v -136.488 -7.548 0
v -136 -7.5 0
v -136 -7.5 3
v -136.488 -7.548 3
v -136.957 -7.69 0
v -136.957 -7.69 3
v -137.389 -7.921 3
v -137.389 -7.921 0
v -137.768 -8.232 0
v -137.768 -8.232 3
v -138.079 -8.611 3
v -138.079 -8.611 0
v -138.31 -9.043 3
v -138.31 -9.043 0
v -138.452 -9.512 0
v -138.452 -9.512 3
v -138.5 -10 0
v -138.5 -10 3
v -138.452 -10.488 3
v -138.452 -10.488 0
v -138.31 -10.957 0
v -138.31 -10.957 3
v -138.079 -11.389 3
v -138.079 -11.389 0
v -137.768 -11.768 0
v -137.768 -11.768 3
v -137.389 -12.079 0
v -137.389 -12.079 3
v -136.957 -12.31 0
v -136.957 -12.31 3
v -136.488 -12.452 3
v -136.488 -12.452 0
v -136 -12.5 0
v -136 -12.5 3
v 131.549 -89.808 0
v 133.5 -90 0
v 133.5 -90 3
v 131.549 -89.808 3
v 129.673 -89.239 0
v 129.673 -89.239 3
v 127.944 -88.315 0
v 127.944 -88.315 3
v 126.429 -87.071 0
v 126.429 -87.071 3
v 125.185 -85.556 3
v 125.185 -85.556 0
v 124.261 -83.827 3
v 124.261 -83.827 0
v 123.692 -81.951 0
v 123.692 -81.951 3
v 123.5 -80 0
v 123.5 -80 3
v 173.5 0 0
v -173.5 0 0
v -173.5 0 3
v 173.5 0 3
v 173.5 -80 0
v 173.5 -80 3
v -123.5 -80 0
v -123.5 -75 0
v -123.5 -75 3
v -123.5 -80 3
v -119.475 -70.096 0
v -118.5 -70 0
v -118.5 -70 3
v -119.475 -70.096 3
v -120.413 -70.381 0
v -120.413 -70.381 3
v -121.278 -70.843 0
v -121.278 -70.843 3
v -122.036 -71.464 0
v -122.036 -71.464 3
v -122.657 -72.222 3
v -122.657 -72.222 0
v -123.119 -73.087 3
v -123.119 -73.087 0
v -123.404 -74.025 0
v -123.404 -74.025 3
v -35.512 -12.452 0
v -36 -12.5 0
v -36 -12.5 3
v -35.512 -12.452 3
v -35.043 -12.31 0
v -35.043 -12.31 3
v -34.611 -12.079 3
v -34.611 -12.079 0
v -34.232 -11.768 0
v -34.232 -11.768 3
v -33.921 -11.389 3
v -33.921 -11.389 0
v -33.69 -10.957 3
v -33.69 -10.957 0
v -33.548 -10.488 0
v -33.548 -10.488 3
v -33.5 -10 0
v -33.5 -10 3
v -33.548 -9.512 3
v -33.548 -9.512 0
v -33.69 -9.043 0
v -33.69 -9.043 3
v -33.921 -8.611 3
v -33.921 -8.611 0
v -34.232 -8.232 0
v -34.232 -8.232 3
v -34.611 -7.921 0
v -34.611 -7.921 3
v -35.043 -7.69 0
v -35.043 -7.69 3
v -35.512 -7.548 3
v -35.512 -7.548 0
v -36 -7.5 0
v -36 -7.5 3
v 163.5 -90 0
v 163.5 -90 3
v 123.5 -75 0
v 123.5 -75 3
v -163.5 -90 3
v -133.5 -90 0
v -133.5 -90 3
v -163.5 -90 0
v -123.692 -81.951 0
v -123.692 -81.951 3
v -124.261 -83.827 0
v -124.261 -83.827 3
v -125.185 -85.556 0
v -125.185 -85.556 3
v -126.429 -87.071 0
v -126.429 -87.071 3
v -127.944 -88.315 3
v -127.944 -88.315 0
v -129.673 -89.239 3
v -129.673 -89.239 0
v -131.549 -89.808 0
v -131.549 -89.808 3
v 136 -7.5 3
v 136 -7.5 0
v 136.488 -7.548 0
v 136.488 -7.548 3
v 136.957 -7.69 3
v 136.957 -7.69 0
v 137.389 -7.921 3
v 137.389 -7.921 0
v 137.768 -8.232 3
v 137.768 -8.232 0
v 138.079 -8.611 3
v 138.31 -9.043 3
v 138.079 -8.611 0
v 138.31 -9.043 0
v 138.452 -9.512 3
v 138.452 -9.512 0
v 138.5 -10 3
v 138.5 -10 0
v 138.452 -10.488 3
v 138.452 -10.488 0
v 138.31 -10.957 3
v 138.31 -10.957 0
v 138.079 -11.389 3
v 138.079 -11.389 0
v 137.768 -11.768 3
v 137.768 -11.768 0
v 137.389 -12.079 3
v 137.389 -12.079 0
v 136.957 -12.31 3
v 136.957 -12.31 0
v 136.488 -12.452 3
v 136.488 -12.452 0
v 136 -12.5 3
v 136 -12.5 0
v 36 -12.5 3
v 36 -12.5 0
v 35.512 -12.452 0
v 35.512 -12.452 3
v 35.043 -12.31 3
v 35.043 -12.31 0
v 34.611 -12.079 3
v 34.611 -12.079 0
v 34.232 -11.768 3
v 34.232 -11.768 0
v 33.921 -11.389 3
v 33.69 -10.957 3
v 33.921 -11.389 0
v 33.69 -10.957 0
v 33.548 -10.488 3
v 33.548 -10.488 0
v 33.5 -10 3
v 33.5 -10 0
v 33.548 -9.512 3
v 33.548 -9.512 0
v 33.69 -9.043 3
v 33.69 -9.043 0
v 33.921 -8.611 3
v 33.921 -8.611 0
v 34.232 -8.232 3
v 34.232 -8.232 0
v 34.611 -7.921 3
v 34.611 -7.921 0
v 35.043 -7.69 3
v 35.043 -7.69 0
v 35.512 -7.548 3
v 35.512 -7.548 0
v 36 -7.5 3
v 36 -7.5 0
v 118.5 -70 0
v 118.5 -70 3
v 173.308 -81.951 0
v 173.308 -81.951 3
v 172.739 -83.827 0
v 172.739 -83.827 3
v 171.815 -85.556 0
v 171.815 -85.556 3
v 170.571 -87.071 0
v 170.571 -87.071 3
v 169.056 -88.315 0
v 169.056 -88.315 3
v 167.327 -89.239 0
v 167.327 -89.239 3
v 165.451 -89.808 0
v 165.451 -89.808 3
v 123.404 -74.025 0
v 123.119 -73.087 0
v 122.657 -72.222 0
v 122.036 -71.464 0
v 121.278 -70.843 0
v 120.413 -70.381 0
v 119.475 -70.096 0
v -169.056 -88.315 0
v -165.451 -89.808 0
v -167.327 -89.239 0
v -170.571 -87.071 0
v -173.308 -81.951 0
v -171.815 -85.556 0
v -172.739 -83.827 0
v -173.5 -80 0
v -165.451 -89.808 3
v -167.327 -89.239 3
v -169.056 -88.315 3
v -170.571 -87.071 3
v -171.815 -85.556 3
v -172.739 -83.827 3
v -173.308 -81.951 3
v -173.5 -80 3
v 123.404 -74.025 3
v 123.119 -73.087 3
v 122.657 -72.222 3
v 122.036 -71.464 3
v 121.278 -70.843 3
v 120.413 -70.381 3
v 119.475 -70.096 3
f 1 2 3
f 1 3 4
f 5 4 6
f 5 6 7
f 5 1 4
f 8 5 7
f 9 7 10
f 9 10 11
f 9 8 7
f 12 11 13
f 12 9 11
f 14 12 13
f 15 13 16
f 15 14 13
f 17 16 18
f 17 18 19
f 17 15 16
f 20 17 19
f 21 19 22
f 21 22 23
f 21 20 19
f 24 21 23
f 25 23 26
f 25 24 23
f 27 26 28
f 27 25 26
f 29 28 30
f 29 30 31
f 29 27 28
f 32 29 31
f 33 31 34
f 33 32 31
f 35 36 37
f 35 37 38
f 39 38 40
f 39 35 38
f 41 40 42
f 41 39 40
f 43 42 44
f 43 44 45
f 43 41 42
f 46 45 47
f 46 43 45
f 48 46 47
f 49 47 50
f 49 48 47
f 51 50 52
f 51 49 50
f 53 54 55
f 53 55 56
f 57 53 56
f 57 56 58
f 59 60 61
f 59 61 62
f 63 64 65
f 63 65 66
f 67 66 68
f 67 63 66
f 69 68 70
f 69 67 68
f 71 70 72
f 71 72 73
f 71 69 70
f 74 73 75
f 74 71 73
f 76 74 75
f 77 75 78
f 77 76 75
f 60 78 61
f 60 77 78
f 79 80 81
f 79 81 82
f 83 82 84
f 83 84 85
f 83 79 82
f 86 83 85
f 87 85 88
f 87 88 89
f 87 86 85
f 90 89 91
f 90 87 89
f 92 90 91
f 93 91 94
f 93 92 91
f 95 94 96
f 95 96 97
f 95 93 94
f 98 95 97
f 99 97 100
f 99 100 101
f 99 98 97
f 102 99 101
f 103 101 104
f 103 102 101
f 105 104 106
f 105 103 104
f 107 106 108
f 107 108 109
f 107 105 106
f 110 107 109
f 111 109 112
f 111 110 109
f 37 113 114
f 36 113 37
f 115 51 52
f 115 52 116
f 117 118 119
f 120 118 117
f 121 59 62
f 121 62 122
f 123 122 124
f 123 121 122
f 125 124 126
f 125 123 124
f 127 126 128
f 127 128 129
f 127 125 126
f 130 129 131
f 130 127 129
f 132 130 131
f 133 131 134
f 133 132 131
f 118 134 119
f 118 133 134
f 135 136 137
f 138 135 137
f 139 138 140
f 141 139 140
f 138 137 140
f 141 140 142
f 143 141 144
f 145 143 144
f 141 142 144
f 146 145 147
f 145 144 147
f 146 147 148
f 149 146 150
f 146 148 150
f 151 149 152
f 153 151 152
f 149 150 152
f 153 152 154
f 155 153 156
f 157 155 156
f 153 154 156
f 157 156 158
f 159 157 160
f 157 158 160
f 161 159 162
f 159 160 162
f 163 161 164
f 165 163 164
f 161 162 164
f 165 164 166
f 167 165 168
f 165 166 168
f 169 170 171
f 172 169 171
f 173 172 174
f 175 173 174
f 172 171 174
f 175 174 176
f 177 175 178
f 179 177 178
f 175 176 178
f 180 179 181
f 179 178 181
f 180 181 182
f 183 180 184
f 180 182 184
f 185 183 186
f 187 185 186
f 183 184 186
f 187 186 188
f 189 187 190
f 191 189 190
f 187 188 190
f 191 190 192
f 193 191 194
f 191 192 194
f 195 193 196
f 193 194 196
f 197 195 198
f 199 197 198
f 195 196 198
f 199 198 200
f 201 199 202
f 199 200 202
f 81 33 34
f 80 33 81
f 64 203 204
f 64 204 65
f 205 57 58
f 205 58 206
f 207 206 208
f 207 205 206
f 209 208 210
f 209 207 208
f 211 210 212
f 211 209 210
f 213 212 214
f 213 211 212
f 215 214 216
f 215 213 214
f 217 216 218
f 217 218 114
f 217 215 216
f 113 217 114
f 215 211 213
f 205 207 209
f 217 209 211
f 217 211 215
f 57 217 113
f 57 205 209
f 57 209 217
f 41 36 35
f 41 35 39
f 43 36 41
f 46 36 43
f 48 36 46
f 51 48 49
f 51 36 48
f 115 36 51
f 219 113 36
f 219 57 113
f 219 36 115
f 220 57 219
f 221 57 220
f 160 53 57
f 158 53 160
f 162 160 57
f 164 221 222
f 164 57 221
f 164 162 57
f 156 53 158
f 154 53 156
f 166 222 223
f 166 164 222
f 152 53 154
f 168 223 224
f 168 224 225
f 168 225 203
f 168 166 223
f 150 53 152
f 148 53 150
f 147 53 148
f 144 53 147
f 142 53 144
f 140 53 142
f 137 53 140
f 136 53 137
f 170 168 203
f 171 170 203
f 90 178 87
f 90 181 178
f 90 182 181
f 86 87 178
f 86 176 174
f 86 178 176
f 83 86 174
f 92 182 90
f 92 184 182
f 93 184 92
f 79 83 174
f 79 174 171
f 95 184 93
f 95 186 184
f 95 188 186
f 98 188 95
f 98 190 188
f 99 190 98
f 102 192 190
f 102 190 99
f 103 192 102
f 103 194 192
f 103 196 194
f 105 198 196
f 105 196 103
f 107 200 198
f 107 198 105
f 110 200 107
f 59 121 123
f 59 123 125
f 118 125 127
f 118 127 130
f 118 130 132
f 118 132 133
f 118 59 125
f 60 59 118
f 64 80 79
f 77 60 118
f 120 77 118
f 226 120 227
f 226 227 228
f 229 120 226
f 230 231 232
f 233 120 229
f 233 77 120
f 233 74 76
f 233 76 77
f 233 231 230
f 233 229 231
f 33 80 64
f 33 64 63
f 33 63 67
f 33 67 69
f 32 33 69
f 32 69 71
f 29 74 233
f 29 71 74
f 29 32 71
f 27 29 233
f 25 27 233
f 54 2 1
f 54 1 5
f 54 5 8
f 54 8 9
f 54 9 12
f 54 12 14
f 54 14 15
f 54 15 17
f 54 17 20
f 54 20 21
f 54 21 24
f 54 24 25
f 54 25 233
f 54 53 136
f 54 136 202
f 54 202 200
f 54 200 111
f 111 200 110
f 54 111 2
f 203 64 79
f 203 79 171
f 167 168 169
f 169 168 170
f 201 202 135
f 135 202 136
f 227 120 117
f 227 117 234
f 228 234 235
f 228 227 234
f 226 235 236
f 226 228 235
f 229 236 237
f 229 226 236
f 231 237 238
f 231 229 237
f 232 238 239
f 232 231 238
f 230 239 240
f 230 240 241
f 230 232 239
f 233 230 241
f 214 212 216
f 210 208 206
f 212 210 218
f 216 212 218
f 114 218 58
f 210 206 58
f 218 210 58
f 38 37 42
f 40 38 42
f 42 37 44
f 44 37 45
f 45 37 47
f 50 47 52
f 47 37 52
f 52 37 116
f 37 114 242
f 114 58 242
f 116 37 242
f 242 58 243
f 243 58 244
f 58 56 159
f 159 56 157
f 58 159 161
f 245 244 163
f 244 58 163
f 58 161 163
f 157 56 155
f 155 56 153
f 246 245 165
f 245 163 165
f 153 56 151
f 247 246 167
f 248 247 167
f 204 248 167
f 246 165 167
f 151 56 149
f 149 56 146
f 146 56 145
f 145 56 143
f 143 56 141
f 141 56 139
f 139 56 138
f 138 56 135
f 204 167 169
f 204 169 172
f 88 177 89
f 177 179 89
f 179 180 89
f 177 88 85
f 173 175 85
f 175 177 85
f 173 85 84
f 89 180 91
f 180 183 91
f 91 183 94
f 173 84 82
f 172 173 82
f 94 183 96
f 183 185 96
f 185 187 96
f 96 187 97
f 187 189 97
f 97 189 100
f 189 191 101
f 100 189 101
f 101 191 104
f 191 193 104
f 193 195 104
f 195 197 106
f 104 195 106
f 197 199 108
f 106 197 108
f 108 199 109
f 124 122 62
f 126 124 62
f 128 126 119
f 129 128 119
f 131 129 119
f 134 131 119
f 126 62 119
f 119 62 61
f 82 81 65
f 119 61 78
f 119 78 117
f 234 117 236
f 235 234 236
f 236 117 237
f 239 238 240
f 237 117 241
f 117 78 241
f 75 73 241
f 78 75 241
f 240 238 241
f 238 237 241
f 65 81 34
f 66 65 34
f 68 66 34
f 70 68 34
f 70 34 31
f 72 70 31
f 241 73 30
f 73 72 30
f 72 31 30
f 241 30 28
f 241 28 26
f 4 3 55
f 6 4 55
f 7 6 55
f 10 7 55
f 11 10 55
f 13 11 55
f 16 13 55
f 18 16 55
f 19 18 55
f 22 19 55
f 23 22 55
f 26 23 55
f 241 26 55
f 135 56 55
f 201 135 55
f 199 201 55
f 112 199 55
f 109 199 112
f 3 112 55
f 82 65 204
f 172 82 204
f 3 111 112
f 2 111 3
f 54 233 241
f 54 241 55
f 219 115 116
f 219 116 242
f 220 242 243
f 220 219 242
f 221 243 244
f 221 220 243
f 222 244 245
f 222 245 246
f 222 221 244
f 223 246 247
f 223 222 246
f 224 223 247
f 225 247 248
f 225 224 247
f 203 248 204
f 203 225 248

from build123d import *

# Parameters (mm, degrees)
BOSS_EXTRUDE1_DEPTH = 3


with BuildPart() as part:
    # Sketch1 → Boss-Extrude1 (new body)
    with BuildSketch(Plane.XY):
        with BuildLine():
            Line((-173.5, 0), (173.5, 0))
            Line((173.5, 0), (173.5, -80))
            ThreePointArc((173.5, -80), (170.571067812, -87.071067812), (163.5, -90))
            Line((163.5, -90), (133.5, -90))
            ThreePointArc((133.5, -90), (126.428932188, -87.071067812), (123.5, -80))
            Line((123.5, -80), (123.5, -75))
            ThreePointArc((123.5, -75), (122.035533906, -71.464466094), (118.5, -70))
            Line((118.5, -70), (-118.5, -70))
            ThreePointArc((-118.5, -70), (-122.035533906, -71.464466094), (-123.5, -75))
            Line((-123.5, -75), (-123.5, -80))
            ThreePointArc((-123.5, -80), (-126.428932188, -87.071067812), (-133.5, -90))
            Line((-133.5, -90), (-163.5, -90))
            ThreePointArc((-163.5, -90), (-170.571067812, -87.071067812), (-173.5, -80))
            Line((-173.5, -80), (-173.5, 0))
        make_face()
        with BuildLine():
            Line((36, -7.5), (136, -7.5))
            ThreePointArc((136, -7.5), (138.5, -10), (136, -12.5))
            Line((136, -12.5), (36, -12.5))
            ThreePointArc((36, -12.5), (33.5, -10), (36, -7.5))
        make_face(mode=Mode.SUBTRACT)
        with BuildLine():
            Line((-36, -7.5), (-136, -7.5))
            ThreePointArc((-136, -7.5), (-138.5, -10), (-136, -12.5))
            Line((-136, -12.5), (-36, -12.5))
            ThreePointArc((-36, -12.5), (-33.5, -10), (-36, -7.5))
        make_face(mode=Mode.SUBTRACT)
    extrude(amount=BOSS_EXTRUDE1_DEPTH)


solid = part.part
